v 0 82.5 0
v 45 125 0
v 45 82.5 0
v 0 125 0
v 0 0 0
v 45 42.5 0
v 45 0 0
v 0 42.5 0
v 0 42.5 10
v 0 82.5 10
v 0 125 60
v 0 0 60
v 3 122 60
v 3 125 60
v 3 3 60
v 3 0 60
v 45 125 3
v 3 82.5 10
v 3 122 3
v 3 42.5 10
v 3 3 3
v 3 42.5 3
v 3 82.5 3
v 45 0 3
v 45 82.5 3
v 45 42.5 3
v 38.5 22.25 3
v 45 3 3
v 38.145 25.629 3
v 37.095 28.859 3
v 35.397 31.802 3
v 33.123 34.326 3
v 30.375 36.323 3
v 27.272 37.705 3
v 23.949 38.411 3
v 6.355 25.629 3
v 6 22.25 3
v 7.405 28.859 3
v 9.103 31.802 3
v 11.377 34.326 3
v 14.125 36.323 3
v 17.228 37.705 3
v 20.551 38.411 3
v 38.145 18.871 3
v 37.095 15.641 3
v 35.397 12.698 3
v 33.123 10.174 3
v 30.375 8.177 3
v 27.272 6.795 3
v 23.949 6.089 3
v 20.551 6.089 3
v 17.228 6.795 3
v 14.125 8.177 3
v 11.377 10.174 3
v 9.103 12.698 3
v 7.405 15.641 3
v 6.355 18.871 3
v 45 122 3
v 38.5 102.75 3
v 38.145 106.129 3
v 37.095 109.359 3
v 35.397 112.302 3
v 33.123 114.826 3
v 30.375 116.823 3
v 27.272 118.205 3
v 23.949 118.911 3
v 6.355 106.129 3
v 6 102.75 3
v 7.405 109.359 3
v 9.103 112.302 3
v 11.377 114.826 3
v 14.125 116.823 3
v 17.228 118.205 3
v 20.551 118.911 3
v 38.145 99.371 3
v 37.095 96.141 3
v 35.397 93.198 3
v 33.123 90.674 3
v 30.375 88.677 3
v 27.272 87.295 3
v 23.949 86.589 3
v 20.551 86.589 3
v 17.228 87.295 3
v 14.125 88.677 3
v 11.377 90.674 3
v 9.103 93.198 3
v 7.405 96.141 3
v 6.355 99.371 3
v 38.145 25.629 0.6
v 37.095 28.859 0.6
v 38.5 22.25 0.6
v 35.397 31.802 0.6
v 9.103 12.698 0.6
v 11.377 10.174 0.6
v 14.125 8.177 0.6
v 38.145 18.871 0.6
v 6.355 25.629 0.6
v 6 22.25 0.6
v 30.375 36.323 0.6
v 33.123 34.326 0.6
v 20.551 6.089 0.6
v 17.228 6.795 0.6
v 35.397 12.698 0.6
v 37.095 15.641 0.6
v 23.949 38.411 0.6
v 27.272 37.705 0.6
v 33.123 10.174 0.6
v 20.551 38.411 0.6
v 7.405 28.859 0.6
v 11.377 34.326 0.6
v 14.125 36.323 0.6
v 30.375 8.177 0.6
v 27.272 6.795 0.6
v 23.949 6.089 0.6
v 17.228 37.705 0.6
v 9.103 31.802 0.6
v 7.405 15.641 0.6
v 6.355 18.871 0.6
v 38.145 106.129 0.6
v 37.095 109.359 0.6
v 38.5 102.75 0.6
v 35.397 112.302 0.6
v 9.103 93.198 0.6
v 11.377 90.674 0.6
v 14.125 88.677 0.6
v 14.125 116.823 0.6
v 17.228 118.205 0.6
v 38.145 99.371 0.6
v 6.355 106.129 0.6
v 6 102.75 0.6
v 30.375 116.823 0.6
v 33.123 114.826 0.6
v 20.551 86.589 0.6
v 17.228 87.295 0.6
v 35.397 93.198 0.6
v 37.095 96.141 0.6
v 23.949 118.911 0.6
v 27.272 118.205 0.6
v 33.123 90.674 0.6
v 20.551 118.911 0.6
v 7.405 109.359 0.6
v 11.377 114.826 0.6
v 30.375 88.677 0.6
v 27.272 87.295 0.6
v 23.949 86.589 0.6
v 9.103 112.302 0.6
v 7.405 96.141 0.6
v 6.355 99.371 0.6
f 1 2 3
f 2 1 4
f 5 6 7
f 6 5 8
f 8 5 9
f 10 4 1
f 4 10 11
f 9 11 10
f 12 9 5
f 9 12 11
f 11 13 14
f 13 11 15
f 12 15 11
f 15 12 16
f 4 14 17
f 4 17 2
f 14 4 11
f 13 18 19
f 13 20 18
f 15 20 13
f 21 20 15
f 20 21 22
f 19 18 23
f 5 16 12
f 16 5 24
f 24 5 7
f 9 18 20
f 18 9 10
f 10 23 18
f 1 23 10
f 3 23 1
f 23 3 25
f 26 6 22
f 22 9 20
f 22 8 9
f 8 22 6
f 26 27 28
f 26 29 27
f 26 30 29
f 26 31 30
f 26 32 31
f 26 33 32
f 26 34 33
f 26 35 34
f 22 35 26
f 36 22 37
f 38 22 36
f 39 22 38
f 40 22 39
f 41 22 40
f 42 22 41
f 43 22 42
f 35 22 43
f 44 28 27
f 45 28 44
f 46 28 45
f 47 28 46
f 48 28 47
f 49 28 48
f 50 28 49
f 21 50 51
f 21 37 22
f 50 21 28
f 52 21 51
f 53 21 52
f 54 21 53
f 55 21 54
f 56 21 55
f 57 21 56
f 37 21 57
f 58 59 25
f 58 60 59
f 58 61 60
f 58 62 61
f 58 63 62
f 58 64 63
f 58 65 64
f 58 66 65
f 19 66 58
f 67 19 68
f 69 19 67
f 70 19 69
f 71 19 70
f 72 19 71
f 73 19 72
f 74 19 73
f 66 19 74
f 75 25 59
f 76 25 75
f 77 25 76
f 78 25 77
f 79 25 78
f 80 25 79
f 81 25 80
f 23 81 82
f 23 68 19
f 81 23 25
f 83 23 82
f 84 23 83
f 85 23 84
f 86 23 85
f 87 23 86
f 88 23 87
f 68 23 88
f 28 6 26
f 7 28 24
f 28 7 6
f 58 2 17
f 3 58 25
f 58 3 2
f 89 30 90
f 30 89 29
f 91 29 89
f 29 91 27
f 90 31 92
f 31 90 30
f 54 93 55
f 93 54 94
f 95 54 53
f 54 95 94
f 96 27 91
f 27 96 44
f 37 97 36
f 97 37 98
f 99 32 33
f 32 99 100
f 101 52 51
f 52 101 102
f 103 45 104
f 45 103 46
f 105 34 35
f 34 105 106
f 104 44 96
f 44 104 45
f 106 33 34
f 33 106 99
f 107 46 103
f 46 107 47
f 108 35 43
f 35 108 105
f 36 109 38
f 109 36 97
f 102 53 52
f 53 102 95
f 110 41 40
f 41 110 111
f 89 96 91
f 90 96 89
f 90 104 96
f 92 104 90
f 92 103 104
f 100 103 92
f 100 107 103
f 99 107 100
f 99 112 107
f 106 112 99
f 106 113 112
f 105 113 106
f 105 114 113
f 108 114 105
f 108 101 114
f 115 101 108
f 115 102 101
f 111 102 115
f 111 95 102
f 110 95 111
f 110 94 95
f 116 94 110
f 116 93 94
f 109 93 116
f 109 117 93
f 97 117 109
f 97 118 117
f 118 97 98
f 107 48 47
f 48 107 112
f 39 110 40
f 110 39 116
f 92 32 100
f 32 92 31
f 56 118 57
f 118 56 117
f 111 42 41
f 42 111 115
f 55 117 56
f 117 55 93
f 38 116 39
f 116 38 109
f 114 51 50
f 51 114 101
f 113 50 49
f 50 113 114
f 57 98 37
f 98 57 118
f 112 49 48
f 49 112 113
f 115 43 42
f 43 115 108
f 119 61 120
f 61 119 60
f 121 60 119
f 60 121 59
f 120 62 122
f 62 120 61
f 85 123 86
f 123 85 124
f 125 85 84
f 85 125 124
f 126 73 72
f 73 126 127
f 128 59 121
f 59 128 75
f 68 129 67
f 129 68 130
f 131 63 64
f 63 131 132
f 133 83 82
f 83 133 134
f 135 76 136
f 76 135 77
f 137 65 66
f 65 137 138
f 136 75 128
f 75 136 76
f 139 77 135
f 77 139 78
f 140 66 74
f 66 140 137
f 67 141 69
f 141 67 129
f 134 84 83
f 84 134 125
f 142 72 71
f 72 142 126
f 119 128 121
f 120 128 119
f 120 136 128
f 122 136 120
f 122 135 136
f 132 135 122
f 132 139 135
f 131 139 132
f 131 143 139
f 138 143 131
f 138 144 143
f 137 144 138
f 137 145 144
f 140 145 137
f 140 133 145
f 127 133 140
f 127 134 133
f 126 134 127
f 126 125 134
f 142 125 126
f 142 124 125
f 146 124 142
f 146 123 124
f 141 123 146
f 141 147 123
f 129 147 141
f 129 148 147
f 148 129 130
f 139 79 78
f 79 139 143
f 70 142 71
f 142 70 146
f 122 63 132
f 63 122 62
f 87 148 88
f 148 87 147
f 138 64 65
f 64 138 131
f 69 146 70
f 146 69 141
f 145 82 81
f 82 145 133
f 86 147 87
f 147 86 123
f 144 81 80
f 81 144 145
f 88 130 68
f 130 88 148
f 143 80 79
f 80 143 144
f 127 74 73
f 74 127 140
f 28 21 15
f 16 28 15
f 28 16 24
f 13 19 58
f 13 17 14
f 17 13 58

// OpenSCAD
//MagCargoHolders
dim_x = 45;
dim_y = 125;
dim_z = 60;
wall_thick = 3;
base_thick = 3;
cutout_x = dim_x;
cutout_y = 40;
cutout_z = 10;
mag_diameter = 32.5;
mag_floor_thick = 0.6;
//
difference()
    {
    linear_extrude(height = dim_z) //inside wall
            square([wall_thick, dim_y]);
    translate([-0.001,dim_y/2-cutout_y/2,-0.001])
        linear_extrude(height=cutout_z+0.001)
        square([cutout_x,cutout_y]);
    }
difference()
    {
    linear_extrude(height = base_thick) // bottom
        square([dim_x, dim_y]);
      translate([-0.001, dim_y/2-cutout_y/2, -0.001])
          linear_extrude(height=cutout_z+0.002)
          square([cutout_x+0.002,cutout_y]);
      translate([mag_diameter/2+2*wall_thick, mag_diameter/2+2*wall_thick,mag_floor_thick])
          cylinder(h = base_thick+0.001,d=mag_diameter);
      translate([mag_diameter/2+2*wall_thick, dim_y-mag_diameter/2-2*wall_thick,mag_floor_thick])
          cylinder(h = base_thick+0.001,d=mag_diameter);
    }
translate([0,wall_thick,0]){
rotate([90,0,0])
linear_extrude(height = base_thick)
    translate([wall_thick,wall_thick,0])
    polygon(points = [[dim_x-wall_thick, 0],[0,dim_z-base_thick],[0,0]]);}
mirror([0,1,0]) translate([0,-dim_y,0])
translate([0,wall_thick,0]){
rotate([90,0,0])
linear_extrude(height = base_thick)
    translate([wall_thick,wall_thick,0])
    polygon(points = [[dim_x-wall_thick, 0],[0,dim_z-base_thick],[0,0]]);}
